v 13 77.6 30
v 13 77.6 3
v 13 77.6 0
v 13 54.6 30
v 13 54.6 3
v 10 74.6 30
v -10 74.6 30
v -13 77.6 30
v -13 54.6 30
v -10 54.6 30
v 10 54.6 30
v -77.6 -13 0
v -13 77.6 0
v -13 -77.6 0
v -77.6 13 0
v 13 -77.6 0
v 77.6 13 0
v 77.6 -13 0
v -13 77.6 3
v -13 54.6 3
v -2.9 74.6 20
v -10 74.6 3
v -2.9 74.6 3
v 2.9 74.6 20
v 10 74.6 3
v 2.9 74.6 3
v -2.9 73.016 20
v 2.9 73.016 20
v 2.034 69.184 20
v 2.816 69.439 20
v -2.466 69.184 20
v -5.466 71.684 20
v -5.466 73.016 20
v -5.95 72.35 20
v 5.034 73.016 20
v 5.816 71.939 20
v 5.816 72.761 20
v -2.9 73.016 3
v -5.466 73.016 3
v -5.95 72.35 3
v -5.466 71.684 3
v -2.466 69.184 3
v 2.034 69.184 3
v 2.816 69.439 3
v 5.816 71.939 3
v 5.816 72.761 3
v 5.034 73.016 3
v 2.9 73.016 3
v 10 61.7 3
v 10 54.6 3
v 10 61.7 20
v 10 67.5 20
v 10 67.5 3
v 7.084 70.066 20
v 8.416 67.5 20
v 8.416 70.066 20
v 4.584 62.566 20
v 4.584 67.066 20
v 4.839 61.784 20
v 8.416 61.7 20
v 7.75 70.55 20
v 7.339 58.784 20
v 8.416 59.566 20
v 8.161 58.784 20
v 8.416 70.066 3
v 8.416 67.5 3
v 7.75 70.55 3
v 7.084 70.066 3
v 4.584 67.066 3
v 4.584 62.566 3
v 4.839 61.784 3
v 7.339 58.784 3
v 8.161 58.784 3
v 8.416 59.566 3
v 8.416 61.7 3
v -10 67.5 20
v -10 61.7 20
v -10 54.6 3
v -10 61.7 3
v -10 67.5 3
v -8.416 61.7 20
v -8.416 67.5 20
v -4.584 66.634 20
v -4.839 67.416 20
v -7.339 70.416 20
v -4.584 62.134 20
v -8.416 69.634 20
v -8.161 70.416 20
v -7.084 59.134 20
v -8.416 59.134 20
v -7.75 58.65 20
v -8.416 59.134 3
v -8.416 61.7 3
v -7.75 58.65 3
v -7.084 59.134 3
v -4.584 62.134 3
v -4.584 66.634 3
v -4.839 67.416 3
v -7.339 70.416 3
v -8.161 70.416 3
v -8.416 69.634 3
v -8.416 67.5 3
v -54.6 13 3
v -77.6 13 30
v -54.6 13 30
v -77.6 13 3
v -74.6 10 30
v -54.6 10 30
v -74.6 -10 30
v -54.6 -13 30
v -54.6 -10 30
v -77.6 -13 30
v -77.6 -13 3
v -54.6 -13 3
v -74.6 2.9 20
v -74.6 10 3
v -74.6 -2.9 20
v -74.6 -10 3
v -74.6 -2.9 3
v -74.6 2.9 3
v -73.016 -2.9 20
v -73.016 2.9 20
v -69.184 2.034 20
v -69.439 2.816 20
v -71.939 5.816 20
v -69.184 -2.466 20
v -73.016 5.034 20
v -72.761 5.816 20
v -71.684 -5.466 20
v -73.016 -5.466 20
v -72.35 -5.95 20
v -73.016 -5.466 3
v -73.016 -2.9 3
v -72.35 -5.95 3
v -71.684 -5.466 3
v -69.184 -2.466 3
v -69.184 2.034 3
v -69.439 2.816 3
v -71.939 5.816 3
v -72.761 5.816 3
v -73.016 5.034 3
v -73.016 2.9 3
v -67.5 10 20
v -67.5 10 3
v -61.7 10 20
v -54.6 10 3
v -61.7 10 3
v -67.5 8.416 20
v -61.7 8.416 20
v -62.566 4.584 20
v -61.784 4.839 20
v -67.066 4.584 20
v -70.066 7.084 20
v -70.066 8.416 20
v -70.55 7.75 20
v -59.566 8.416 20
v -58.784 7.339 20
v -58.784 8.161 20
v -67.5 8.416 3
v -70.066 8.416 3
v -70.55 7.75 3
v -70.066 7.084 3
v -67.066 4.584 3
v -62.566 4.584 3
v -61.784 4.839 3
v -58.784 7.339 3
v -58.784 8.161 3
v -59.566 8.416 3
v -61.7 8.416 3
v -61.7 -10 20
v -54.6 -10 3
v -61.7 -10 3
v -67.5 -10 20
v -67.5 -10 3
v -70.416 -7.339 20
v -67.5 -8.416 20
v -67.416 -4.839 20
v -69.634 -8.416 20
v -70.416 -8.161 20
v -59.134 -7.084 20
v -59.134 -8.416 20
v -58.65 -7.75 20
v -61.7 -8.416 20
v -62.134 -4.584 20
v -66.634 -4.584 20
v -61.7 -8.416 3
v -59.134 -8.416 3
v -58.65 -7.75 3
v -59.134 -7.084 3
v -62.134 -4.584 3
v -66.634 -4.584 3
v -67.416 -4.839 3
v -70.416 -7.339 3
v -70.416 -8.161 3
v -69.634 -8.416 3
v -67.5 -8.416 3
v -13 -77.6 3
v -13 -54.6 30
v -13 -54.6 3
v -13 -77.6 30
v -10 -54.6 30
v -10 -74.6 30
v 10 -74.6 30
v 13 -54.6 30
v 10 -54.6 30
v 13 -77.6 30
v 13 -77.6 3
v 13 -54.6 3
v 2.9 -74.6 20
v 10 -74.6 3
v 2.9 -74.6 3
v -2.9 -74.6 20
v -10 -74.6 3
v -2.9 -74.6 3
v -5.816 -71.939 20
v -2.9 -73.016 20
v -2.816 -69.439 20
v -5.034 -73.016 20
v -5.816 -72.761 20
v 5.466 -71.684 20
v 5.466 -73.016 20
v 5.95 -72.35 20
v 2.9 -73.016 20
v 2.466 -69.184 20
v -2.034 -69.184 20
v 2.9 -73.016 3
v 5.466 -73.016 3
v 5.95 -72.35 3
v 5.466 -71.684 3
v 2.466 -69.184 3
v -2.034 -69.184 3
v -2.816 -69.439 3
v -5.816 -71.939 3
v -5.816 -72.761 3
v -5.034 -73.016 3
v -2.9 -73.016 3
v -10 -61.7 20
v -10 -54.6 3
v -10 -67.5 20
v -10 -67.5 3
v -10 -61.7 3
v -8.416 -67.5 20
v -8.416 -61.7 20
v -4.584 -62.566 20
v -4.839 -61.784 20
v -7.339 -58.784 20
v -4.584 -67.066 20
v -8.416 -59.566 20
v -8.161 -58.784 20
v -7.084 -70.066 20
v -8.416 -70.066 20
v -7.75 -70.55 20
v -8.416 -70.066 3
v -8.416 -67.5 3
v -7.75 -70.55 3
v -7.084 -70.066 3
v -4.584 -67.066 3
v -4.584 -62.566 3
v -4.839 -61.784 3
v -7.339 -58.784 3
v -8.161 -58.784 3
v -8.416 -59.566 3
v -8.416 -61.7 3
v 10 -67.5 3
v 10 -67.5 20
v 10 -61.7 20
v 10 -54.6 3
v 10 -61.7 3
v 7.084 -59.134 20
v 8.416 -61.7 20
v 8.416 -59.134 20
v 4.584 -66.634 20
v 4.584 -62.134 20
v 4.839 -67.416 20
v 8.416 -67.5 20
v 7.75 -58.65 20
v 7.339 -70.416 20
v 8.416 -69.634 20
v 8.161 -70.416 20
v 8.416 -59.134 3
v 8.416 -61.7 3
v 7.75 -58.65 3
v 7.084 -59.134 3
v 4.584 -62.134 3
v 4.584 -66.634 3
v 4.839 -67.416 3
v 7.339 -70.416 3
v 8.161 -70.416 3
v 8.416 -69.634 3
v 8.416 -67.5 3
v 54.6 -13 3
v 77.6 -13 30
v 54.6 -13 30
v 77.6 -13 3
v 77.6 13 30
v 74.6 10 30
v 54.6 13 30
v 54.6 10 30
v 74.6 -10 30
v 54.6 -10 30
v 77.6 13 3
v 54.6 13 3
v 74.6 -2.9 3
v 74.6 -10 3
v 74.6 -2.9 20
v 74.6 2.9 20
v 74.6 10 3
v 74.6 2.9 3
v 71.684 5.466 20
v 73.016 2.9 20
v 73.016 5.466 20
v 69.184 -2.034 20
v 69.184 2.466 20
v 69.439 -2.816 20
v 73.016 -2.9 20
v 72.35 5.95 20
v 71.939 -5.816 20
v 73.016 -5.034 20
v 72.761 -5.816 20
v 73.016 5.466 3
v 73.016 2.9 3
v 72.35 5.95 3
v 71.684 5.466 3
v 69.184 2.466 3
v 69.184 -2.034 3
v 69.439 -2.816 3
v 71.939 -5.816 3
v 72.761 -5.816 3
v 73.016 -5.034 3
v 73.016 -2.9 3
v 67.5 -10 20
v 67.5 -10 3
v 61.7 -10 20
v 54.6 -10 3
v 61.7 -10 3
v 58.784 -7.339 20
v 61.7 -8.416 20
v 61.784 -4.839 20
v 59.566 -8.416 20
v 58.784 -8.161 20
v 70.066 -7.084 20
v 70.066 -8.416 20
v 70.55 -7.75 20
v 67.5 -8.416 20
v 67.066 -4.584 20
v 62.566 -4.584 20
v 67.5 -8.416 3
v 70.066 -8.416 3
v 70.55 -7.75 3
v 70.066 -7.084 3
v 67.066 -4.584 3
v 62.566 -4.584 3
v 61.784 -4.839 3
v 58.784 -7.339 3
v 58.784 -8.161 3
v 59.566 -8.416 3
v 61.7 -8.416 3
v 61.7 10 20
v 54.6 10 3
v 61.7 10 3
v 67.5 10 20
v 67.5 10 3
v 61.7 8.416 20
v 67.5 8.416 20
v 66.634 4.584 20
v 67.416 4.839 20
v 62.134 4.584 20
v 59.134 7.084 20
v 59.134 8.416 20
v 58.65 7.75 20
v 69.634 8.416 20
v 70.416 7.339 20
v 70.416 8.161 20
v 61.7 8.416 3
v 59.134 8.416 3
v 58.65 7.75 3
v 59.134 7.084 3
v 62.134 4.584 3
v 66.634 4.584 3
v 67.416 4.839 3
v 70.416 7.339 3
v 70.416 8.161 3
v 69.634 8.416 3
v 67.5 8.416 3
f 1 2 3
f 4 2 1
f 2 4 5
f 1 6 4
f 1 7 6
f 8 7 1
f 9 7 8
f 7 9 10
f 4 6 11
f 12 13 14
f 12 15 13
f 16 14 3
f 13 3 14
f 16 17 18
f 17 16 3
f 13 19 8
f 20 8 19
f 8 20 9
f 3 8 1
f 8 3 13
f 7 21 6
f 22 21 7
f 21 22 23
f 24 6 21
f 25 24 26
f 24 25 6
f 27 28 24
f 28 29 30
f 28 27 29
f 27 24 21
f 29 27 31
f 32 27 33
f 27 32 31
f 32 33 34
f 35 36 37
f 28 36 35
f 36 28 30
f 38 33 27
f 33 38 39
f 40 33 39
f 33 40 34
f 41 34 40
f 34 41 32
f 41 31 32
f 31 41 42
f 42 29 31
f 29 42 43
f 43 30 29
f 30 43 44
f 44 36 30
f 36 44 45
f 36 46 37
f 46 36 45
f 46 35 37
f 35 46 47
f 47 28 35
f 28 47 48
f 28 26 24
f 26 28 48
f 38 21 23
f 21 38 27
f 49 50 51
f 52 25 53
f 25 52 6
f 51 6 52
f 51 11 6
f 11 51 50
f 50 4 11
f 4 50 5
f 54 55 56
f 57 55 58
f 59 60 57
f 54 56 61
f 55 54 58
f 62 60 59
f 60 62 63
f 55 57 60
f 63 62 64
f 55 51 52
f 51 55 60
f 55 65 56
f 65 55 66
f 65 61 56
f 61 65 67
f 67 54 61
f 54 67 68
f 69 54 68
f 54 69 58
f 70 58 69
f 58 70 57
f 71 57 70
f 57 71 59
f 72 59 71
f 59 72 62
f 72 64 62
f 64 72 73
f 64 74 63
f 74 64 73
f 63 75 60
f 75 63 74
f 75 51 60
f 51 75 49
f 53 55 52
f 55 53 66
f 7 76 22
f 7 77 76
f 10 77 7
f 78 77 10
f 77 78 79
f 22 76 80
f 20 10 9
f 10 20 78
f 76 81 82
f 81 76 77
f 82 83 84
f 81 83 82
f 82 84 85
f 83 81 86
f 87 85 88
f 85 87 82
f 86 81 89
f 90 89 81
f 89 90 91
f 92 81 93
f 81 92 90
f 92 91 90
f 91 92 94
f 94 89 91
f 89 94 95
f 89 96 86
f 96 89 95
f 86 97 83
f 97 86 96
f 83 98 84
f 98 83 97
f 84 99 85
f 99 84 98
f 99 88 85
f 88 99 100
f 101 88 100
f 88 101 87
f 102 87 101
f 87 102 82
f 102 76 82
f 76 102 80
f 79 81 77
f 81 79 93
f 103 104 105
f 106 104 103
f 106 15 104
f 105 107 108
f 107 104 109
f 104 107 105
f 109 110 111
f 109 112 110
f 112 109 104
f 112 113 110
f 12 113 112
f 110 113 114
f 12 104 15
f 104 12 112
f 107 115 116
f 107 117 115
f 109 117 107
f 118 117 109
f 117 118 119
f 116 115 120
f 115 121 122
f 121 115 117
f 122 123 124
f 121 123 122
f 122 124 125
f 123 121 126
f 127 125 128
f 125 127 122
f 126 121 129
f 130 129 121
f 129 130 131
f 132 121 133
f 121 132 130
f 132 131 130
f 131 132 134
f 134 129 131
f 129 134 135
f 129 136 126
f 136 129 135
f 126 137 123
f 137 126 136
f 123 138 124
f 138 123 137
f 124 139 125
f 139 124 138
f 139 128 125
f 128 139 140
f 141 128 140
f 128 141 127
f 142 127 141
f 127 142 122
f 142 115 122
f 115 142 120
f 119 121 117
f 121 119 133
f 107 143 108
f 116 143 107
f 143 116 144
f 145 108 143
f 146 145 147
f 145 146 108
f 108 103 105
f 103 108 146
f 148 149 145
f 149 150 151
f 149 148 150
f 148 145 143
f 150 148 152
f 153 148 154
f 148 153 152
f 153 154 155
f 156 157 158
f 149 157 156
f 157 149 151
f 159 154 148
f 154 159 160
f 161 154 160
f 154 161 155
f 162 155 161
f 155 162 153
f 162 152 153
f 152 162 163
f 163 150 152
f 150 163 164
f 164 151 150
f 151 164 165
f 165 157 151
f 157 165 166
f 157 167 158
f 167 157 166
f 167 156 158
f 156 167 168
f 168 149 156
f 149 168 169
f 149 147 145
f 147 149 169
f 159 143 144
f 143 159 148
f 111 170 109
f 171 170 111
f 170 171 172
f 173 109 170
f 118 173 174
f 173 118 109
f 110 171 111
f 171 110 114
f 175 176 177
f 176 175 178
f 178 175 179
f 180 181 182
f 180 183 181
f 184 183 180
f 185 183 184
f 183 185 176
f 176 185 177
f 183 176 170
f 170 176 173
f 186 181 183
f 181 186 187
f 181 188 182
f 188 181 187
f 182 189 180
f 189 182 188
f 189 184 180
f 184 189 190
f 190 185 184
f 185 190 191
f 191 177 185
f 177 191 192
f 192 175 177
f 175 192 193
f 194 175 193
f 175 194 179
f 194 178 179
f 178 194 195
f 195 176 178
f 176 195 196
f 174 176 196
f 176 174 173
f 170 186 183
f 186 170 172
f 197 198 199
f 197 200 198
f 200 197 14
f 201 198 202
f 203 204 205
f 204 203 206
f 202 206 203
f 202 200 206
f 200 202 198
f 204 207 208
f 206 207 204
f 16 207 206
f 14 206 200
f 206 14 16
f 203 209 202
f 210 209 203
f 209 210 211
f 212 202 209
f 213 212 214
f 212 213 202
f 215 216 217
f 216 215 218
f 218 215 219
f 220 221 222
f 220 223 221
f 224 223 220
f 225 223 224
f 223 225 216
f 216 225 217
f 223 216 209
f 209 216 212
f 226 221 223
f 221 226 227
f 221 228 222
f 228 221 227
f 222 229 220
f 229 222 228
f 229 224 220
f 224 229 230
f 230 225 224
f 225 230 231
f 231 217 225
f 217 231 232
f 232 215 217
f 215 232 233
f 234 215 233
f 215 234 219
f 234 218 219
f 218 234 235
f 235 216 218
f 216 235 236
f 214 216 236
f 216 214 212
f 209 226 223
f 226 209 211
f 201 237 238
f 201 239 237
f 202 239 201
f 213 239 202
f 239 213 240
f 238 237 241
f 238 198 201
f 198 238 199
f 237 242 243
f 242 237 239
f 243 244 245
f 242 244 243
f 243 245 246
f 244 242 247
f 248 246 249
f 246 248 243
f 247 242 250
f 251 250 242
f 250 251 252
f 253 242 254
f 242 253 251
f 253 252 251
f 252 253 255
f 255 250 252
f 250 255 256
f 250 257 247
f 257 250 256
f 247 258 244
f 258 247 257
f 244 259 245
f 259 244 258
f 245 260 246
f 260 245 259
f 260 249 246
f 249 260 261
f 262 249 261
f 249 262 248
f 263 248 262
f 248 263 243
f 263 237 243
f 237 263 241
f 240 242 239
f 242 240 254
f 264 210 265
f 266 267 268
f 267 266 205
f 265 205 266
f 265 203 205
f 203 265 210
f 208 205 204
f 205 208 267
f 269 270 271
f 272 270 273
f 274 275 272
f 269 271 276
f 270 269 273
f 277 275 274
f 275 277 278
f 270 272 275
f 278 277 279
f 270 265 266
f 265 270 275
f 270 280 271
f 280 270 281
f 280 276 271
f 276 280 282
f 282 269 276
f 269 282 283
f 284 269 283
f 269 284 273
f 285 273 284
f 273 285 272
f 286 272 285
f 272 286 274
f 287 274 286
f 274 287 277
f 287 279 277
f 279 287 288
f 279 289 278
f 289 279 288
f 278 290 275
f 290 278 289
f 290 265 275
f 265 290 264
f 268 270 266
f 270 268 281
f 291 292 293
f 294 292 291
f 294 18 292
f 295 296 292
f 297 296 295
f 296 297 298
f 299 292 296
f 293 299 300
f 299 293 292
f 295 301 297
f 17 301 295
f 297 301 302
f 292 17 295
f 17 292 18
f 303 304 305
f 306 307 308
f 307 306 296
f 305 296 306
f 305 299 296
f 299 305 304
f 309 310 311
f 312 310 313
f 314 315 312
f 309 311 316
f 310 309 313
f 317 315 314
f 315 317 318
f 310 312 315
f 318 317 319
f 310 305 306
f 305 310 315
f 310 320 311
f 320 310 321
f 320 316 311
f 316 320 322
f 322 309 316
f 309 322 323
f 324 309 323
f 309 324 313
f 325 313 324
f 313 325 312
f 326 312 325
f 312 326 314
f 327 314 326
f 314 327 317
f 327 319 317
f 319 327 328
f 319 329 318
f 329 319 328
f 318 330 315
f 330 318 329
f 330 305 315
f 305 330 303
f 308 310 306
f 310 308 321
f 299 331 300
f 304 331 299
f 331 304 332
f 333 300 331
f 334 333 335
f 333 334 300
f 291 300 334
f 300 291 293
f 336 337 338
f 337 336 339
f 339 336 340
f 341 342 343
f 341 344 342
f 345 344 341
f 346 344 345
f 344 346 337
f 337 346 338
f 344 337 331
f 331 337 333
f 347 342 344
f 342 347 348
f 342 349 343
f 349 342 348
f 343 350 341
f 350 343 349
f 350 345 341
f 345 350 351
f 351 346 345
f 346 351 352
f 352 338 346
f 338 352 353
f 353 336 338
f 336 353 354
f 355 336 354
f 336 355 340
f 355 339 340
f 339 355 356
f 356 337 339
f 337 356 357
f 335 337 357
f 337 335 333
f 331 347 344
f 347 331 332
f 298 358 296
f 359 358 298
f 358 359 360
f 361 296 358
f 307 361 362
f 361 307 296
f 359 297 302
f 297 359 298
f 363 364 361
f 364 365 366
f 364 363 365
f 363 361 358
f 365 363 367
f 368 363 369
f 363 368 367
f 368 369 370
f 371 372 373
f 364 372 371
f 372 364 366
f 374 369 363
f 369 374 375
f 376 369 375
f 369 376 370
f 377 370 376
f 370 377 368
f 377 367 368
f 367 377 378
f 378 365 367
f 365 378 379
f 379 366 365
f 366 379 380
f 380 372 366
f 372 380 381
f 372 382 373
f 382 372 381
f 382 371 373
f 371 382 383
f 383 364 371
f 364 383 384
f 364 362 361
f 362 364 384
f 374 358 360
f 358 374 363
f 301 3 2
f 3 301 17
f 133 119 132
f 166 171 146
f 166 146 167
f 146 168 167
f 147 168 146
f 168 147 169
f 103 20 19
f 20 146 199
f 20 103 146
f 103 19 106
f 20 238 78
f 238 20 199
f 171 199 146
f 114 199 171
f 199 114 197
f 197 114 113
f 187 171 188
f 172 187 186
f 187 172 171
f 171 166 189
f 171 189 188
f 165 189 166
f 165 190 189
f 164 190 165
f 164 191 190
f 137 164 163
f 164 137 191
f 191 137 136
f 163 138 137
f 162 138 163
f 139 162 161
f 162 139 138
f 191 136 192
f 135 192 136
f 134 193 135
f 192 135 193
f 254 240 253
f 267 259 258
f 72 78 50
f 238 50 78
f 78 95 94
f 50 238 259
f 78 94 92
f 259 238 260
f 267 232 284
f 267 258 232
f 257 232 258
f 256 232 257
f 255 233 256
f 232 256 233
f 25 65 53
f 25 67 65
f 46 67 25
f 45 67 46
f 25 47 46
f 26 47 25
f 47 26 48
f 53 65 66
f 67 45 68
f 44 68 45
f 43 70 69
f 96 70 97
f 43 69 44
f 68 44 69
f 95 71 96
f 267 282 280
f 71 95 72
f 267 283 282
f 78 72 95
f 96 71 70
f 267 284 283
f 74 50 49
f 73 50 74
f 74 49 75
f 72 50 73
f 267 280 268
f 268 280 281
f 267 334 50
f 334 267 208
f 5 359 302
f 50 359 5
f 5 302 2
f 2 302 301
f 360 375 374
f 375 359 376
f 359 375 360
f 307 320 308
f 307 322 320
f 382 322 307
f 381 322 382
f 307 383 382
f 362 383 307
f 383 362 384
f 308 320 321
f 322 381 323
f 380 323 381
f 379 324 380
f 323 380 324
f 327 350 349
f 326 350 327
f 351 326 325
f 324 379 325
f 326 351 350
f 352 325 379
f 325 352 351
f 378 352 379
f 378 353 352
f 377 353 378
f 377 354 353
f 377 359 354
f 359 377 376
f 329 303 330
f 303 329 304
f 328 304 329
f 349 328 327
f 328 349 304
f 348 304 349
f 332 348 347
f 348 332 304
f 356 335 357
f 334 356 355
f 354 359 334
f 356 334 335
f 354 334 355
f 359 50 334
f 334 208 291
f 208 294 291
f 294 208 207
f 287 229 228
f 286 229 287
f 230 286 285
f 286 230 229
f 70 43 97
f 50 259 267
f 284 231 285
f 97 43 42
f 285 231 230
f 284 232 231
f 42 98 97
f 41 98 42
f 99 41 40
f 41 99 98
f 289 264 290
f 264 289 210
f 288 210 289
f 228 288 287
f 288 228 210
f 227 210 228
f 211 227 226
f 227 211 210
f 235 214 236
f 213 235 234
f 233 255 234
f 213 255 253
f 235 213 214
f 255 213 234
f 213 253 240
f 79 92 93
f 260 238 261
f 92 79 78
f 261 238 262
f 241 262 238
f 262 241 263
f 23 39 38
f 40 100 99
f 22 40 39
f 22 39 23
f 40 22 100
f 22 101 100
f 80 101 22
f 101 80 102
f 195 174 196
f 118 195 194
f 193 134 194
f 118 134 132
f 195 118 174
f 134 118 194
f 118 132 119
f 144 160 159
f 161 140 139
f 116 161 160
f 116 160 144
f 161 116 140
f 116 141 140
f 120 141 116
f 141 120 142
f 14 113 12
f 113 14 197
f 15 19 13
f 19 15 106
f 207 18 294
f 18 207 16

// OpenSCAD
largeurSupport = 26;
taillePlatine = 155.2;
hauteurSupport = 30;

for (i = [0 : 3]) {
	rotate([0, 0, i * 90]) {
		translate([0, 54.6,0])
	support();
	}
}
platine();

module support() {
	union() {
		translate([-13, 20, 0]) cube([26, 3, hauteurSupport]);
		translate([0, 20, 0]) rotate(180) fleche();
		translate([10, 0, 0]) cube([3, 23, hauteurSupport]);
		translate([10, 10, 0]) rotate(90) fleche();
		translate([-13, 0, 0]) cube([3, 23, hauteurSupport]);
		translate([-10, 10, 0]) rotate(-90) fleche();
	}
}

module platine() {
	linear_extrude(height = 3, center = false, convexity = 10, twist = 0)
	polygon([	[-taillePlatine / 2, largeurSupport / 2], [-largeurSupport / 2, taillePlatine / 2],
				[largeurSupport / 2, taillePlatine / 2], [taillePlatine / 2, largeurSupport / 2],
				[taillePlatine / 2, -largeurSupport / 2], [largeurSupport / 2, -taillePlatine / 2],
				[-largeurSupport / 2, -taillePlatine / 2], [-taillePlatine / 2, -largeurSupport / 2]
	]);
}

module fleche() {
	linear_extrude(height = 20, center = false, convexity = 10, twist = 0)
	union() {
		translate([-2.9, 0, 0]) square([5.8, 5]);
		hull() {
			translate([5.25, 2.25, 0]) circle(0.7, true);
			translate([-5.25, 2.25, 0]) circle(0.7, true);
			translate([-2.25, 4.75, 0]) circle(0.7, true);
			translate([2.25, 4.75, 0]) circle(0.7, true);
		}
	}
}
